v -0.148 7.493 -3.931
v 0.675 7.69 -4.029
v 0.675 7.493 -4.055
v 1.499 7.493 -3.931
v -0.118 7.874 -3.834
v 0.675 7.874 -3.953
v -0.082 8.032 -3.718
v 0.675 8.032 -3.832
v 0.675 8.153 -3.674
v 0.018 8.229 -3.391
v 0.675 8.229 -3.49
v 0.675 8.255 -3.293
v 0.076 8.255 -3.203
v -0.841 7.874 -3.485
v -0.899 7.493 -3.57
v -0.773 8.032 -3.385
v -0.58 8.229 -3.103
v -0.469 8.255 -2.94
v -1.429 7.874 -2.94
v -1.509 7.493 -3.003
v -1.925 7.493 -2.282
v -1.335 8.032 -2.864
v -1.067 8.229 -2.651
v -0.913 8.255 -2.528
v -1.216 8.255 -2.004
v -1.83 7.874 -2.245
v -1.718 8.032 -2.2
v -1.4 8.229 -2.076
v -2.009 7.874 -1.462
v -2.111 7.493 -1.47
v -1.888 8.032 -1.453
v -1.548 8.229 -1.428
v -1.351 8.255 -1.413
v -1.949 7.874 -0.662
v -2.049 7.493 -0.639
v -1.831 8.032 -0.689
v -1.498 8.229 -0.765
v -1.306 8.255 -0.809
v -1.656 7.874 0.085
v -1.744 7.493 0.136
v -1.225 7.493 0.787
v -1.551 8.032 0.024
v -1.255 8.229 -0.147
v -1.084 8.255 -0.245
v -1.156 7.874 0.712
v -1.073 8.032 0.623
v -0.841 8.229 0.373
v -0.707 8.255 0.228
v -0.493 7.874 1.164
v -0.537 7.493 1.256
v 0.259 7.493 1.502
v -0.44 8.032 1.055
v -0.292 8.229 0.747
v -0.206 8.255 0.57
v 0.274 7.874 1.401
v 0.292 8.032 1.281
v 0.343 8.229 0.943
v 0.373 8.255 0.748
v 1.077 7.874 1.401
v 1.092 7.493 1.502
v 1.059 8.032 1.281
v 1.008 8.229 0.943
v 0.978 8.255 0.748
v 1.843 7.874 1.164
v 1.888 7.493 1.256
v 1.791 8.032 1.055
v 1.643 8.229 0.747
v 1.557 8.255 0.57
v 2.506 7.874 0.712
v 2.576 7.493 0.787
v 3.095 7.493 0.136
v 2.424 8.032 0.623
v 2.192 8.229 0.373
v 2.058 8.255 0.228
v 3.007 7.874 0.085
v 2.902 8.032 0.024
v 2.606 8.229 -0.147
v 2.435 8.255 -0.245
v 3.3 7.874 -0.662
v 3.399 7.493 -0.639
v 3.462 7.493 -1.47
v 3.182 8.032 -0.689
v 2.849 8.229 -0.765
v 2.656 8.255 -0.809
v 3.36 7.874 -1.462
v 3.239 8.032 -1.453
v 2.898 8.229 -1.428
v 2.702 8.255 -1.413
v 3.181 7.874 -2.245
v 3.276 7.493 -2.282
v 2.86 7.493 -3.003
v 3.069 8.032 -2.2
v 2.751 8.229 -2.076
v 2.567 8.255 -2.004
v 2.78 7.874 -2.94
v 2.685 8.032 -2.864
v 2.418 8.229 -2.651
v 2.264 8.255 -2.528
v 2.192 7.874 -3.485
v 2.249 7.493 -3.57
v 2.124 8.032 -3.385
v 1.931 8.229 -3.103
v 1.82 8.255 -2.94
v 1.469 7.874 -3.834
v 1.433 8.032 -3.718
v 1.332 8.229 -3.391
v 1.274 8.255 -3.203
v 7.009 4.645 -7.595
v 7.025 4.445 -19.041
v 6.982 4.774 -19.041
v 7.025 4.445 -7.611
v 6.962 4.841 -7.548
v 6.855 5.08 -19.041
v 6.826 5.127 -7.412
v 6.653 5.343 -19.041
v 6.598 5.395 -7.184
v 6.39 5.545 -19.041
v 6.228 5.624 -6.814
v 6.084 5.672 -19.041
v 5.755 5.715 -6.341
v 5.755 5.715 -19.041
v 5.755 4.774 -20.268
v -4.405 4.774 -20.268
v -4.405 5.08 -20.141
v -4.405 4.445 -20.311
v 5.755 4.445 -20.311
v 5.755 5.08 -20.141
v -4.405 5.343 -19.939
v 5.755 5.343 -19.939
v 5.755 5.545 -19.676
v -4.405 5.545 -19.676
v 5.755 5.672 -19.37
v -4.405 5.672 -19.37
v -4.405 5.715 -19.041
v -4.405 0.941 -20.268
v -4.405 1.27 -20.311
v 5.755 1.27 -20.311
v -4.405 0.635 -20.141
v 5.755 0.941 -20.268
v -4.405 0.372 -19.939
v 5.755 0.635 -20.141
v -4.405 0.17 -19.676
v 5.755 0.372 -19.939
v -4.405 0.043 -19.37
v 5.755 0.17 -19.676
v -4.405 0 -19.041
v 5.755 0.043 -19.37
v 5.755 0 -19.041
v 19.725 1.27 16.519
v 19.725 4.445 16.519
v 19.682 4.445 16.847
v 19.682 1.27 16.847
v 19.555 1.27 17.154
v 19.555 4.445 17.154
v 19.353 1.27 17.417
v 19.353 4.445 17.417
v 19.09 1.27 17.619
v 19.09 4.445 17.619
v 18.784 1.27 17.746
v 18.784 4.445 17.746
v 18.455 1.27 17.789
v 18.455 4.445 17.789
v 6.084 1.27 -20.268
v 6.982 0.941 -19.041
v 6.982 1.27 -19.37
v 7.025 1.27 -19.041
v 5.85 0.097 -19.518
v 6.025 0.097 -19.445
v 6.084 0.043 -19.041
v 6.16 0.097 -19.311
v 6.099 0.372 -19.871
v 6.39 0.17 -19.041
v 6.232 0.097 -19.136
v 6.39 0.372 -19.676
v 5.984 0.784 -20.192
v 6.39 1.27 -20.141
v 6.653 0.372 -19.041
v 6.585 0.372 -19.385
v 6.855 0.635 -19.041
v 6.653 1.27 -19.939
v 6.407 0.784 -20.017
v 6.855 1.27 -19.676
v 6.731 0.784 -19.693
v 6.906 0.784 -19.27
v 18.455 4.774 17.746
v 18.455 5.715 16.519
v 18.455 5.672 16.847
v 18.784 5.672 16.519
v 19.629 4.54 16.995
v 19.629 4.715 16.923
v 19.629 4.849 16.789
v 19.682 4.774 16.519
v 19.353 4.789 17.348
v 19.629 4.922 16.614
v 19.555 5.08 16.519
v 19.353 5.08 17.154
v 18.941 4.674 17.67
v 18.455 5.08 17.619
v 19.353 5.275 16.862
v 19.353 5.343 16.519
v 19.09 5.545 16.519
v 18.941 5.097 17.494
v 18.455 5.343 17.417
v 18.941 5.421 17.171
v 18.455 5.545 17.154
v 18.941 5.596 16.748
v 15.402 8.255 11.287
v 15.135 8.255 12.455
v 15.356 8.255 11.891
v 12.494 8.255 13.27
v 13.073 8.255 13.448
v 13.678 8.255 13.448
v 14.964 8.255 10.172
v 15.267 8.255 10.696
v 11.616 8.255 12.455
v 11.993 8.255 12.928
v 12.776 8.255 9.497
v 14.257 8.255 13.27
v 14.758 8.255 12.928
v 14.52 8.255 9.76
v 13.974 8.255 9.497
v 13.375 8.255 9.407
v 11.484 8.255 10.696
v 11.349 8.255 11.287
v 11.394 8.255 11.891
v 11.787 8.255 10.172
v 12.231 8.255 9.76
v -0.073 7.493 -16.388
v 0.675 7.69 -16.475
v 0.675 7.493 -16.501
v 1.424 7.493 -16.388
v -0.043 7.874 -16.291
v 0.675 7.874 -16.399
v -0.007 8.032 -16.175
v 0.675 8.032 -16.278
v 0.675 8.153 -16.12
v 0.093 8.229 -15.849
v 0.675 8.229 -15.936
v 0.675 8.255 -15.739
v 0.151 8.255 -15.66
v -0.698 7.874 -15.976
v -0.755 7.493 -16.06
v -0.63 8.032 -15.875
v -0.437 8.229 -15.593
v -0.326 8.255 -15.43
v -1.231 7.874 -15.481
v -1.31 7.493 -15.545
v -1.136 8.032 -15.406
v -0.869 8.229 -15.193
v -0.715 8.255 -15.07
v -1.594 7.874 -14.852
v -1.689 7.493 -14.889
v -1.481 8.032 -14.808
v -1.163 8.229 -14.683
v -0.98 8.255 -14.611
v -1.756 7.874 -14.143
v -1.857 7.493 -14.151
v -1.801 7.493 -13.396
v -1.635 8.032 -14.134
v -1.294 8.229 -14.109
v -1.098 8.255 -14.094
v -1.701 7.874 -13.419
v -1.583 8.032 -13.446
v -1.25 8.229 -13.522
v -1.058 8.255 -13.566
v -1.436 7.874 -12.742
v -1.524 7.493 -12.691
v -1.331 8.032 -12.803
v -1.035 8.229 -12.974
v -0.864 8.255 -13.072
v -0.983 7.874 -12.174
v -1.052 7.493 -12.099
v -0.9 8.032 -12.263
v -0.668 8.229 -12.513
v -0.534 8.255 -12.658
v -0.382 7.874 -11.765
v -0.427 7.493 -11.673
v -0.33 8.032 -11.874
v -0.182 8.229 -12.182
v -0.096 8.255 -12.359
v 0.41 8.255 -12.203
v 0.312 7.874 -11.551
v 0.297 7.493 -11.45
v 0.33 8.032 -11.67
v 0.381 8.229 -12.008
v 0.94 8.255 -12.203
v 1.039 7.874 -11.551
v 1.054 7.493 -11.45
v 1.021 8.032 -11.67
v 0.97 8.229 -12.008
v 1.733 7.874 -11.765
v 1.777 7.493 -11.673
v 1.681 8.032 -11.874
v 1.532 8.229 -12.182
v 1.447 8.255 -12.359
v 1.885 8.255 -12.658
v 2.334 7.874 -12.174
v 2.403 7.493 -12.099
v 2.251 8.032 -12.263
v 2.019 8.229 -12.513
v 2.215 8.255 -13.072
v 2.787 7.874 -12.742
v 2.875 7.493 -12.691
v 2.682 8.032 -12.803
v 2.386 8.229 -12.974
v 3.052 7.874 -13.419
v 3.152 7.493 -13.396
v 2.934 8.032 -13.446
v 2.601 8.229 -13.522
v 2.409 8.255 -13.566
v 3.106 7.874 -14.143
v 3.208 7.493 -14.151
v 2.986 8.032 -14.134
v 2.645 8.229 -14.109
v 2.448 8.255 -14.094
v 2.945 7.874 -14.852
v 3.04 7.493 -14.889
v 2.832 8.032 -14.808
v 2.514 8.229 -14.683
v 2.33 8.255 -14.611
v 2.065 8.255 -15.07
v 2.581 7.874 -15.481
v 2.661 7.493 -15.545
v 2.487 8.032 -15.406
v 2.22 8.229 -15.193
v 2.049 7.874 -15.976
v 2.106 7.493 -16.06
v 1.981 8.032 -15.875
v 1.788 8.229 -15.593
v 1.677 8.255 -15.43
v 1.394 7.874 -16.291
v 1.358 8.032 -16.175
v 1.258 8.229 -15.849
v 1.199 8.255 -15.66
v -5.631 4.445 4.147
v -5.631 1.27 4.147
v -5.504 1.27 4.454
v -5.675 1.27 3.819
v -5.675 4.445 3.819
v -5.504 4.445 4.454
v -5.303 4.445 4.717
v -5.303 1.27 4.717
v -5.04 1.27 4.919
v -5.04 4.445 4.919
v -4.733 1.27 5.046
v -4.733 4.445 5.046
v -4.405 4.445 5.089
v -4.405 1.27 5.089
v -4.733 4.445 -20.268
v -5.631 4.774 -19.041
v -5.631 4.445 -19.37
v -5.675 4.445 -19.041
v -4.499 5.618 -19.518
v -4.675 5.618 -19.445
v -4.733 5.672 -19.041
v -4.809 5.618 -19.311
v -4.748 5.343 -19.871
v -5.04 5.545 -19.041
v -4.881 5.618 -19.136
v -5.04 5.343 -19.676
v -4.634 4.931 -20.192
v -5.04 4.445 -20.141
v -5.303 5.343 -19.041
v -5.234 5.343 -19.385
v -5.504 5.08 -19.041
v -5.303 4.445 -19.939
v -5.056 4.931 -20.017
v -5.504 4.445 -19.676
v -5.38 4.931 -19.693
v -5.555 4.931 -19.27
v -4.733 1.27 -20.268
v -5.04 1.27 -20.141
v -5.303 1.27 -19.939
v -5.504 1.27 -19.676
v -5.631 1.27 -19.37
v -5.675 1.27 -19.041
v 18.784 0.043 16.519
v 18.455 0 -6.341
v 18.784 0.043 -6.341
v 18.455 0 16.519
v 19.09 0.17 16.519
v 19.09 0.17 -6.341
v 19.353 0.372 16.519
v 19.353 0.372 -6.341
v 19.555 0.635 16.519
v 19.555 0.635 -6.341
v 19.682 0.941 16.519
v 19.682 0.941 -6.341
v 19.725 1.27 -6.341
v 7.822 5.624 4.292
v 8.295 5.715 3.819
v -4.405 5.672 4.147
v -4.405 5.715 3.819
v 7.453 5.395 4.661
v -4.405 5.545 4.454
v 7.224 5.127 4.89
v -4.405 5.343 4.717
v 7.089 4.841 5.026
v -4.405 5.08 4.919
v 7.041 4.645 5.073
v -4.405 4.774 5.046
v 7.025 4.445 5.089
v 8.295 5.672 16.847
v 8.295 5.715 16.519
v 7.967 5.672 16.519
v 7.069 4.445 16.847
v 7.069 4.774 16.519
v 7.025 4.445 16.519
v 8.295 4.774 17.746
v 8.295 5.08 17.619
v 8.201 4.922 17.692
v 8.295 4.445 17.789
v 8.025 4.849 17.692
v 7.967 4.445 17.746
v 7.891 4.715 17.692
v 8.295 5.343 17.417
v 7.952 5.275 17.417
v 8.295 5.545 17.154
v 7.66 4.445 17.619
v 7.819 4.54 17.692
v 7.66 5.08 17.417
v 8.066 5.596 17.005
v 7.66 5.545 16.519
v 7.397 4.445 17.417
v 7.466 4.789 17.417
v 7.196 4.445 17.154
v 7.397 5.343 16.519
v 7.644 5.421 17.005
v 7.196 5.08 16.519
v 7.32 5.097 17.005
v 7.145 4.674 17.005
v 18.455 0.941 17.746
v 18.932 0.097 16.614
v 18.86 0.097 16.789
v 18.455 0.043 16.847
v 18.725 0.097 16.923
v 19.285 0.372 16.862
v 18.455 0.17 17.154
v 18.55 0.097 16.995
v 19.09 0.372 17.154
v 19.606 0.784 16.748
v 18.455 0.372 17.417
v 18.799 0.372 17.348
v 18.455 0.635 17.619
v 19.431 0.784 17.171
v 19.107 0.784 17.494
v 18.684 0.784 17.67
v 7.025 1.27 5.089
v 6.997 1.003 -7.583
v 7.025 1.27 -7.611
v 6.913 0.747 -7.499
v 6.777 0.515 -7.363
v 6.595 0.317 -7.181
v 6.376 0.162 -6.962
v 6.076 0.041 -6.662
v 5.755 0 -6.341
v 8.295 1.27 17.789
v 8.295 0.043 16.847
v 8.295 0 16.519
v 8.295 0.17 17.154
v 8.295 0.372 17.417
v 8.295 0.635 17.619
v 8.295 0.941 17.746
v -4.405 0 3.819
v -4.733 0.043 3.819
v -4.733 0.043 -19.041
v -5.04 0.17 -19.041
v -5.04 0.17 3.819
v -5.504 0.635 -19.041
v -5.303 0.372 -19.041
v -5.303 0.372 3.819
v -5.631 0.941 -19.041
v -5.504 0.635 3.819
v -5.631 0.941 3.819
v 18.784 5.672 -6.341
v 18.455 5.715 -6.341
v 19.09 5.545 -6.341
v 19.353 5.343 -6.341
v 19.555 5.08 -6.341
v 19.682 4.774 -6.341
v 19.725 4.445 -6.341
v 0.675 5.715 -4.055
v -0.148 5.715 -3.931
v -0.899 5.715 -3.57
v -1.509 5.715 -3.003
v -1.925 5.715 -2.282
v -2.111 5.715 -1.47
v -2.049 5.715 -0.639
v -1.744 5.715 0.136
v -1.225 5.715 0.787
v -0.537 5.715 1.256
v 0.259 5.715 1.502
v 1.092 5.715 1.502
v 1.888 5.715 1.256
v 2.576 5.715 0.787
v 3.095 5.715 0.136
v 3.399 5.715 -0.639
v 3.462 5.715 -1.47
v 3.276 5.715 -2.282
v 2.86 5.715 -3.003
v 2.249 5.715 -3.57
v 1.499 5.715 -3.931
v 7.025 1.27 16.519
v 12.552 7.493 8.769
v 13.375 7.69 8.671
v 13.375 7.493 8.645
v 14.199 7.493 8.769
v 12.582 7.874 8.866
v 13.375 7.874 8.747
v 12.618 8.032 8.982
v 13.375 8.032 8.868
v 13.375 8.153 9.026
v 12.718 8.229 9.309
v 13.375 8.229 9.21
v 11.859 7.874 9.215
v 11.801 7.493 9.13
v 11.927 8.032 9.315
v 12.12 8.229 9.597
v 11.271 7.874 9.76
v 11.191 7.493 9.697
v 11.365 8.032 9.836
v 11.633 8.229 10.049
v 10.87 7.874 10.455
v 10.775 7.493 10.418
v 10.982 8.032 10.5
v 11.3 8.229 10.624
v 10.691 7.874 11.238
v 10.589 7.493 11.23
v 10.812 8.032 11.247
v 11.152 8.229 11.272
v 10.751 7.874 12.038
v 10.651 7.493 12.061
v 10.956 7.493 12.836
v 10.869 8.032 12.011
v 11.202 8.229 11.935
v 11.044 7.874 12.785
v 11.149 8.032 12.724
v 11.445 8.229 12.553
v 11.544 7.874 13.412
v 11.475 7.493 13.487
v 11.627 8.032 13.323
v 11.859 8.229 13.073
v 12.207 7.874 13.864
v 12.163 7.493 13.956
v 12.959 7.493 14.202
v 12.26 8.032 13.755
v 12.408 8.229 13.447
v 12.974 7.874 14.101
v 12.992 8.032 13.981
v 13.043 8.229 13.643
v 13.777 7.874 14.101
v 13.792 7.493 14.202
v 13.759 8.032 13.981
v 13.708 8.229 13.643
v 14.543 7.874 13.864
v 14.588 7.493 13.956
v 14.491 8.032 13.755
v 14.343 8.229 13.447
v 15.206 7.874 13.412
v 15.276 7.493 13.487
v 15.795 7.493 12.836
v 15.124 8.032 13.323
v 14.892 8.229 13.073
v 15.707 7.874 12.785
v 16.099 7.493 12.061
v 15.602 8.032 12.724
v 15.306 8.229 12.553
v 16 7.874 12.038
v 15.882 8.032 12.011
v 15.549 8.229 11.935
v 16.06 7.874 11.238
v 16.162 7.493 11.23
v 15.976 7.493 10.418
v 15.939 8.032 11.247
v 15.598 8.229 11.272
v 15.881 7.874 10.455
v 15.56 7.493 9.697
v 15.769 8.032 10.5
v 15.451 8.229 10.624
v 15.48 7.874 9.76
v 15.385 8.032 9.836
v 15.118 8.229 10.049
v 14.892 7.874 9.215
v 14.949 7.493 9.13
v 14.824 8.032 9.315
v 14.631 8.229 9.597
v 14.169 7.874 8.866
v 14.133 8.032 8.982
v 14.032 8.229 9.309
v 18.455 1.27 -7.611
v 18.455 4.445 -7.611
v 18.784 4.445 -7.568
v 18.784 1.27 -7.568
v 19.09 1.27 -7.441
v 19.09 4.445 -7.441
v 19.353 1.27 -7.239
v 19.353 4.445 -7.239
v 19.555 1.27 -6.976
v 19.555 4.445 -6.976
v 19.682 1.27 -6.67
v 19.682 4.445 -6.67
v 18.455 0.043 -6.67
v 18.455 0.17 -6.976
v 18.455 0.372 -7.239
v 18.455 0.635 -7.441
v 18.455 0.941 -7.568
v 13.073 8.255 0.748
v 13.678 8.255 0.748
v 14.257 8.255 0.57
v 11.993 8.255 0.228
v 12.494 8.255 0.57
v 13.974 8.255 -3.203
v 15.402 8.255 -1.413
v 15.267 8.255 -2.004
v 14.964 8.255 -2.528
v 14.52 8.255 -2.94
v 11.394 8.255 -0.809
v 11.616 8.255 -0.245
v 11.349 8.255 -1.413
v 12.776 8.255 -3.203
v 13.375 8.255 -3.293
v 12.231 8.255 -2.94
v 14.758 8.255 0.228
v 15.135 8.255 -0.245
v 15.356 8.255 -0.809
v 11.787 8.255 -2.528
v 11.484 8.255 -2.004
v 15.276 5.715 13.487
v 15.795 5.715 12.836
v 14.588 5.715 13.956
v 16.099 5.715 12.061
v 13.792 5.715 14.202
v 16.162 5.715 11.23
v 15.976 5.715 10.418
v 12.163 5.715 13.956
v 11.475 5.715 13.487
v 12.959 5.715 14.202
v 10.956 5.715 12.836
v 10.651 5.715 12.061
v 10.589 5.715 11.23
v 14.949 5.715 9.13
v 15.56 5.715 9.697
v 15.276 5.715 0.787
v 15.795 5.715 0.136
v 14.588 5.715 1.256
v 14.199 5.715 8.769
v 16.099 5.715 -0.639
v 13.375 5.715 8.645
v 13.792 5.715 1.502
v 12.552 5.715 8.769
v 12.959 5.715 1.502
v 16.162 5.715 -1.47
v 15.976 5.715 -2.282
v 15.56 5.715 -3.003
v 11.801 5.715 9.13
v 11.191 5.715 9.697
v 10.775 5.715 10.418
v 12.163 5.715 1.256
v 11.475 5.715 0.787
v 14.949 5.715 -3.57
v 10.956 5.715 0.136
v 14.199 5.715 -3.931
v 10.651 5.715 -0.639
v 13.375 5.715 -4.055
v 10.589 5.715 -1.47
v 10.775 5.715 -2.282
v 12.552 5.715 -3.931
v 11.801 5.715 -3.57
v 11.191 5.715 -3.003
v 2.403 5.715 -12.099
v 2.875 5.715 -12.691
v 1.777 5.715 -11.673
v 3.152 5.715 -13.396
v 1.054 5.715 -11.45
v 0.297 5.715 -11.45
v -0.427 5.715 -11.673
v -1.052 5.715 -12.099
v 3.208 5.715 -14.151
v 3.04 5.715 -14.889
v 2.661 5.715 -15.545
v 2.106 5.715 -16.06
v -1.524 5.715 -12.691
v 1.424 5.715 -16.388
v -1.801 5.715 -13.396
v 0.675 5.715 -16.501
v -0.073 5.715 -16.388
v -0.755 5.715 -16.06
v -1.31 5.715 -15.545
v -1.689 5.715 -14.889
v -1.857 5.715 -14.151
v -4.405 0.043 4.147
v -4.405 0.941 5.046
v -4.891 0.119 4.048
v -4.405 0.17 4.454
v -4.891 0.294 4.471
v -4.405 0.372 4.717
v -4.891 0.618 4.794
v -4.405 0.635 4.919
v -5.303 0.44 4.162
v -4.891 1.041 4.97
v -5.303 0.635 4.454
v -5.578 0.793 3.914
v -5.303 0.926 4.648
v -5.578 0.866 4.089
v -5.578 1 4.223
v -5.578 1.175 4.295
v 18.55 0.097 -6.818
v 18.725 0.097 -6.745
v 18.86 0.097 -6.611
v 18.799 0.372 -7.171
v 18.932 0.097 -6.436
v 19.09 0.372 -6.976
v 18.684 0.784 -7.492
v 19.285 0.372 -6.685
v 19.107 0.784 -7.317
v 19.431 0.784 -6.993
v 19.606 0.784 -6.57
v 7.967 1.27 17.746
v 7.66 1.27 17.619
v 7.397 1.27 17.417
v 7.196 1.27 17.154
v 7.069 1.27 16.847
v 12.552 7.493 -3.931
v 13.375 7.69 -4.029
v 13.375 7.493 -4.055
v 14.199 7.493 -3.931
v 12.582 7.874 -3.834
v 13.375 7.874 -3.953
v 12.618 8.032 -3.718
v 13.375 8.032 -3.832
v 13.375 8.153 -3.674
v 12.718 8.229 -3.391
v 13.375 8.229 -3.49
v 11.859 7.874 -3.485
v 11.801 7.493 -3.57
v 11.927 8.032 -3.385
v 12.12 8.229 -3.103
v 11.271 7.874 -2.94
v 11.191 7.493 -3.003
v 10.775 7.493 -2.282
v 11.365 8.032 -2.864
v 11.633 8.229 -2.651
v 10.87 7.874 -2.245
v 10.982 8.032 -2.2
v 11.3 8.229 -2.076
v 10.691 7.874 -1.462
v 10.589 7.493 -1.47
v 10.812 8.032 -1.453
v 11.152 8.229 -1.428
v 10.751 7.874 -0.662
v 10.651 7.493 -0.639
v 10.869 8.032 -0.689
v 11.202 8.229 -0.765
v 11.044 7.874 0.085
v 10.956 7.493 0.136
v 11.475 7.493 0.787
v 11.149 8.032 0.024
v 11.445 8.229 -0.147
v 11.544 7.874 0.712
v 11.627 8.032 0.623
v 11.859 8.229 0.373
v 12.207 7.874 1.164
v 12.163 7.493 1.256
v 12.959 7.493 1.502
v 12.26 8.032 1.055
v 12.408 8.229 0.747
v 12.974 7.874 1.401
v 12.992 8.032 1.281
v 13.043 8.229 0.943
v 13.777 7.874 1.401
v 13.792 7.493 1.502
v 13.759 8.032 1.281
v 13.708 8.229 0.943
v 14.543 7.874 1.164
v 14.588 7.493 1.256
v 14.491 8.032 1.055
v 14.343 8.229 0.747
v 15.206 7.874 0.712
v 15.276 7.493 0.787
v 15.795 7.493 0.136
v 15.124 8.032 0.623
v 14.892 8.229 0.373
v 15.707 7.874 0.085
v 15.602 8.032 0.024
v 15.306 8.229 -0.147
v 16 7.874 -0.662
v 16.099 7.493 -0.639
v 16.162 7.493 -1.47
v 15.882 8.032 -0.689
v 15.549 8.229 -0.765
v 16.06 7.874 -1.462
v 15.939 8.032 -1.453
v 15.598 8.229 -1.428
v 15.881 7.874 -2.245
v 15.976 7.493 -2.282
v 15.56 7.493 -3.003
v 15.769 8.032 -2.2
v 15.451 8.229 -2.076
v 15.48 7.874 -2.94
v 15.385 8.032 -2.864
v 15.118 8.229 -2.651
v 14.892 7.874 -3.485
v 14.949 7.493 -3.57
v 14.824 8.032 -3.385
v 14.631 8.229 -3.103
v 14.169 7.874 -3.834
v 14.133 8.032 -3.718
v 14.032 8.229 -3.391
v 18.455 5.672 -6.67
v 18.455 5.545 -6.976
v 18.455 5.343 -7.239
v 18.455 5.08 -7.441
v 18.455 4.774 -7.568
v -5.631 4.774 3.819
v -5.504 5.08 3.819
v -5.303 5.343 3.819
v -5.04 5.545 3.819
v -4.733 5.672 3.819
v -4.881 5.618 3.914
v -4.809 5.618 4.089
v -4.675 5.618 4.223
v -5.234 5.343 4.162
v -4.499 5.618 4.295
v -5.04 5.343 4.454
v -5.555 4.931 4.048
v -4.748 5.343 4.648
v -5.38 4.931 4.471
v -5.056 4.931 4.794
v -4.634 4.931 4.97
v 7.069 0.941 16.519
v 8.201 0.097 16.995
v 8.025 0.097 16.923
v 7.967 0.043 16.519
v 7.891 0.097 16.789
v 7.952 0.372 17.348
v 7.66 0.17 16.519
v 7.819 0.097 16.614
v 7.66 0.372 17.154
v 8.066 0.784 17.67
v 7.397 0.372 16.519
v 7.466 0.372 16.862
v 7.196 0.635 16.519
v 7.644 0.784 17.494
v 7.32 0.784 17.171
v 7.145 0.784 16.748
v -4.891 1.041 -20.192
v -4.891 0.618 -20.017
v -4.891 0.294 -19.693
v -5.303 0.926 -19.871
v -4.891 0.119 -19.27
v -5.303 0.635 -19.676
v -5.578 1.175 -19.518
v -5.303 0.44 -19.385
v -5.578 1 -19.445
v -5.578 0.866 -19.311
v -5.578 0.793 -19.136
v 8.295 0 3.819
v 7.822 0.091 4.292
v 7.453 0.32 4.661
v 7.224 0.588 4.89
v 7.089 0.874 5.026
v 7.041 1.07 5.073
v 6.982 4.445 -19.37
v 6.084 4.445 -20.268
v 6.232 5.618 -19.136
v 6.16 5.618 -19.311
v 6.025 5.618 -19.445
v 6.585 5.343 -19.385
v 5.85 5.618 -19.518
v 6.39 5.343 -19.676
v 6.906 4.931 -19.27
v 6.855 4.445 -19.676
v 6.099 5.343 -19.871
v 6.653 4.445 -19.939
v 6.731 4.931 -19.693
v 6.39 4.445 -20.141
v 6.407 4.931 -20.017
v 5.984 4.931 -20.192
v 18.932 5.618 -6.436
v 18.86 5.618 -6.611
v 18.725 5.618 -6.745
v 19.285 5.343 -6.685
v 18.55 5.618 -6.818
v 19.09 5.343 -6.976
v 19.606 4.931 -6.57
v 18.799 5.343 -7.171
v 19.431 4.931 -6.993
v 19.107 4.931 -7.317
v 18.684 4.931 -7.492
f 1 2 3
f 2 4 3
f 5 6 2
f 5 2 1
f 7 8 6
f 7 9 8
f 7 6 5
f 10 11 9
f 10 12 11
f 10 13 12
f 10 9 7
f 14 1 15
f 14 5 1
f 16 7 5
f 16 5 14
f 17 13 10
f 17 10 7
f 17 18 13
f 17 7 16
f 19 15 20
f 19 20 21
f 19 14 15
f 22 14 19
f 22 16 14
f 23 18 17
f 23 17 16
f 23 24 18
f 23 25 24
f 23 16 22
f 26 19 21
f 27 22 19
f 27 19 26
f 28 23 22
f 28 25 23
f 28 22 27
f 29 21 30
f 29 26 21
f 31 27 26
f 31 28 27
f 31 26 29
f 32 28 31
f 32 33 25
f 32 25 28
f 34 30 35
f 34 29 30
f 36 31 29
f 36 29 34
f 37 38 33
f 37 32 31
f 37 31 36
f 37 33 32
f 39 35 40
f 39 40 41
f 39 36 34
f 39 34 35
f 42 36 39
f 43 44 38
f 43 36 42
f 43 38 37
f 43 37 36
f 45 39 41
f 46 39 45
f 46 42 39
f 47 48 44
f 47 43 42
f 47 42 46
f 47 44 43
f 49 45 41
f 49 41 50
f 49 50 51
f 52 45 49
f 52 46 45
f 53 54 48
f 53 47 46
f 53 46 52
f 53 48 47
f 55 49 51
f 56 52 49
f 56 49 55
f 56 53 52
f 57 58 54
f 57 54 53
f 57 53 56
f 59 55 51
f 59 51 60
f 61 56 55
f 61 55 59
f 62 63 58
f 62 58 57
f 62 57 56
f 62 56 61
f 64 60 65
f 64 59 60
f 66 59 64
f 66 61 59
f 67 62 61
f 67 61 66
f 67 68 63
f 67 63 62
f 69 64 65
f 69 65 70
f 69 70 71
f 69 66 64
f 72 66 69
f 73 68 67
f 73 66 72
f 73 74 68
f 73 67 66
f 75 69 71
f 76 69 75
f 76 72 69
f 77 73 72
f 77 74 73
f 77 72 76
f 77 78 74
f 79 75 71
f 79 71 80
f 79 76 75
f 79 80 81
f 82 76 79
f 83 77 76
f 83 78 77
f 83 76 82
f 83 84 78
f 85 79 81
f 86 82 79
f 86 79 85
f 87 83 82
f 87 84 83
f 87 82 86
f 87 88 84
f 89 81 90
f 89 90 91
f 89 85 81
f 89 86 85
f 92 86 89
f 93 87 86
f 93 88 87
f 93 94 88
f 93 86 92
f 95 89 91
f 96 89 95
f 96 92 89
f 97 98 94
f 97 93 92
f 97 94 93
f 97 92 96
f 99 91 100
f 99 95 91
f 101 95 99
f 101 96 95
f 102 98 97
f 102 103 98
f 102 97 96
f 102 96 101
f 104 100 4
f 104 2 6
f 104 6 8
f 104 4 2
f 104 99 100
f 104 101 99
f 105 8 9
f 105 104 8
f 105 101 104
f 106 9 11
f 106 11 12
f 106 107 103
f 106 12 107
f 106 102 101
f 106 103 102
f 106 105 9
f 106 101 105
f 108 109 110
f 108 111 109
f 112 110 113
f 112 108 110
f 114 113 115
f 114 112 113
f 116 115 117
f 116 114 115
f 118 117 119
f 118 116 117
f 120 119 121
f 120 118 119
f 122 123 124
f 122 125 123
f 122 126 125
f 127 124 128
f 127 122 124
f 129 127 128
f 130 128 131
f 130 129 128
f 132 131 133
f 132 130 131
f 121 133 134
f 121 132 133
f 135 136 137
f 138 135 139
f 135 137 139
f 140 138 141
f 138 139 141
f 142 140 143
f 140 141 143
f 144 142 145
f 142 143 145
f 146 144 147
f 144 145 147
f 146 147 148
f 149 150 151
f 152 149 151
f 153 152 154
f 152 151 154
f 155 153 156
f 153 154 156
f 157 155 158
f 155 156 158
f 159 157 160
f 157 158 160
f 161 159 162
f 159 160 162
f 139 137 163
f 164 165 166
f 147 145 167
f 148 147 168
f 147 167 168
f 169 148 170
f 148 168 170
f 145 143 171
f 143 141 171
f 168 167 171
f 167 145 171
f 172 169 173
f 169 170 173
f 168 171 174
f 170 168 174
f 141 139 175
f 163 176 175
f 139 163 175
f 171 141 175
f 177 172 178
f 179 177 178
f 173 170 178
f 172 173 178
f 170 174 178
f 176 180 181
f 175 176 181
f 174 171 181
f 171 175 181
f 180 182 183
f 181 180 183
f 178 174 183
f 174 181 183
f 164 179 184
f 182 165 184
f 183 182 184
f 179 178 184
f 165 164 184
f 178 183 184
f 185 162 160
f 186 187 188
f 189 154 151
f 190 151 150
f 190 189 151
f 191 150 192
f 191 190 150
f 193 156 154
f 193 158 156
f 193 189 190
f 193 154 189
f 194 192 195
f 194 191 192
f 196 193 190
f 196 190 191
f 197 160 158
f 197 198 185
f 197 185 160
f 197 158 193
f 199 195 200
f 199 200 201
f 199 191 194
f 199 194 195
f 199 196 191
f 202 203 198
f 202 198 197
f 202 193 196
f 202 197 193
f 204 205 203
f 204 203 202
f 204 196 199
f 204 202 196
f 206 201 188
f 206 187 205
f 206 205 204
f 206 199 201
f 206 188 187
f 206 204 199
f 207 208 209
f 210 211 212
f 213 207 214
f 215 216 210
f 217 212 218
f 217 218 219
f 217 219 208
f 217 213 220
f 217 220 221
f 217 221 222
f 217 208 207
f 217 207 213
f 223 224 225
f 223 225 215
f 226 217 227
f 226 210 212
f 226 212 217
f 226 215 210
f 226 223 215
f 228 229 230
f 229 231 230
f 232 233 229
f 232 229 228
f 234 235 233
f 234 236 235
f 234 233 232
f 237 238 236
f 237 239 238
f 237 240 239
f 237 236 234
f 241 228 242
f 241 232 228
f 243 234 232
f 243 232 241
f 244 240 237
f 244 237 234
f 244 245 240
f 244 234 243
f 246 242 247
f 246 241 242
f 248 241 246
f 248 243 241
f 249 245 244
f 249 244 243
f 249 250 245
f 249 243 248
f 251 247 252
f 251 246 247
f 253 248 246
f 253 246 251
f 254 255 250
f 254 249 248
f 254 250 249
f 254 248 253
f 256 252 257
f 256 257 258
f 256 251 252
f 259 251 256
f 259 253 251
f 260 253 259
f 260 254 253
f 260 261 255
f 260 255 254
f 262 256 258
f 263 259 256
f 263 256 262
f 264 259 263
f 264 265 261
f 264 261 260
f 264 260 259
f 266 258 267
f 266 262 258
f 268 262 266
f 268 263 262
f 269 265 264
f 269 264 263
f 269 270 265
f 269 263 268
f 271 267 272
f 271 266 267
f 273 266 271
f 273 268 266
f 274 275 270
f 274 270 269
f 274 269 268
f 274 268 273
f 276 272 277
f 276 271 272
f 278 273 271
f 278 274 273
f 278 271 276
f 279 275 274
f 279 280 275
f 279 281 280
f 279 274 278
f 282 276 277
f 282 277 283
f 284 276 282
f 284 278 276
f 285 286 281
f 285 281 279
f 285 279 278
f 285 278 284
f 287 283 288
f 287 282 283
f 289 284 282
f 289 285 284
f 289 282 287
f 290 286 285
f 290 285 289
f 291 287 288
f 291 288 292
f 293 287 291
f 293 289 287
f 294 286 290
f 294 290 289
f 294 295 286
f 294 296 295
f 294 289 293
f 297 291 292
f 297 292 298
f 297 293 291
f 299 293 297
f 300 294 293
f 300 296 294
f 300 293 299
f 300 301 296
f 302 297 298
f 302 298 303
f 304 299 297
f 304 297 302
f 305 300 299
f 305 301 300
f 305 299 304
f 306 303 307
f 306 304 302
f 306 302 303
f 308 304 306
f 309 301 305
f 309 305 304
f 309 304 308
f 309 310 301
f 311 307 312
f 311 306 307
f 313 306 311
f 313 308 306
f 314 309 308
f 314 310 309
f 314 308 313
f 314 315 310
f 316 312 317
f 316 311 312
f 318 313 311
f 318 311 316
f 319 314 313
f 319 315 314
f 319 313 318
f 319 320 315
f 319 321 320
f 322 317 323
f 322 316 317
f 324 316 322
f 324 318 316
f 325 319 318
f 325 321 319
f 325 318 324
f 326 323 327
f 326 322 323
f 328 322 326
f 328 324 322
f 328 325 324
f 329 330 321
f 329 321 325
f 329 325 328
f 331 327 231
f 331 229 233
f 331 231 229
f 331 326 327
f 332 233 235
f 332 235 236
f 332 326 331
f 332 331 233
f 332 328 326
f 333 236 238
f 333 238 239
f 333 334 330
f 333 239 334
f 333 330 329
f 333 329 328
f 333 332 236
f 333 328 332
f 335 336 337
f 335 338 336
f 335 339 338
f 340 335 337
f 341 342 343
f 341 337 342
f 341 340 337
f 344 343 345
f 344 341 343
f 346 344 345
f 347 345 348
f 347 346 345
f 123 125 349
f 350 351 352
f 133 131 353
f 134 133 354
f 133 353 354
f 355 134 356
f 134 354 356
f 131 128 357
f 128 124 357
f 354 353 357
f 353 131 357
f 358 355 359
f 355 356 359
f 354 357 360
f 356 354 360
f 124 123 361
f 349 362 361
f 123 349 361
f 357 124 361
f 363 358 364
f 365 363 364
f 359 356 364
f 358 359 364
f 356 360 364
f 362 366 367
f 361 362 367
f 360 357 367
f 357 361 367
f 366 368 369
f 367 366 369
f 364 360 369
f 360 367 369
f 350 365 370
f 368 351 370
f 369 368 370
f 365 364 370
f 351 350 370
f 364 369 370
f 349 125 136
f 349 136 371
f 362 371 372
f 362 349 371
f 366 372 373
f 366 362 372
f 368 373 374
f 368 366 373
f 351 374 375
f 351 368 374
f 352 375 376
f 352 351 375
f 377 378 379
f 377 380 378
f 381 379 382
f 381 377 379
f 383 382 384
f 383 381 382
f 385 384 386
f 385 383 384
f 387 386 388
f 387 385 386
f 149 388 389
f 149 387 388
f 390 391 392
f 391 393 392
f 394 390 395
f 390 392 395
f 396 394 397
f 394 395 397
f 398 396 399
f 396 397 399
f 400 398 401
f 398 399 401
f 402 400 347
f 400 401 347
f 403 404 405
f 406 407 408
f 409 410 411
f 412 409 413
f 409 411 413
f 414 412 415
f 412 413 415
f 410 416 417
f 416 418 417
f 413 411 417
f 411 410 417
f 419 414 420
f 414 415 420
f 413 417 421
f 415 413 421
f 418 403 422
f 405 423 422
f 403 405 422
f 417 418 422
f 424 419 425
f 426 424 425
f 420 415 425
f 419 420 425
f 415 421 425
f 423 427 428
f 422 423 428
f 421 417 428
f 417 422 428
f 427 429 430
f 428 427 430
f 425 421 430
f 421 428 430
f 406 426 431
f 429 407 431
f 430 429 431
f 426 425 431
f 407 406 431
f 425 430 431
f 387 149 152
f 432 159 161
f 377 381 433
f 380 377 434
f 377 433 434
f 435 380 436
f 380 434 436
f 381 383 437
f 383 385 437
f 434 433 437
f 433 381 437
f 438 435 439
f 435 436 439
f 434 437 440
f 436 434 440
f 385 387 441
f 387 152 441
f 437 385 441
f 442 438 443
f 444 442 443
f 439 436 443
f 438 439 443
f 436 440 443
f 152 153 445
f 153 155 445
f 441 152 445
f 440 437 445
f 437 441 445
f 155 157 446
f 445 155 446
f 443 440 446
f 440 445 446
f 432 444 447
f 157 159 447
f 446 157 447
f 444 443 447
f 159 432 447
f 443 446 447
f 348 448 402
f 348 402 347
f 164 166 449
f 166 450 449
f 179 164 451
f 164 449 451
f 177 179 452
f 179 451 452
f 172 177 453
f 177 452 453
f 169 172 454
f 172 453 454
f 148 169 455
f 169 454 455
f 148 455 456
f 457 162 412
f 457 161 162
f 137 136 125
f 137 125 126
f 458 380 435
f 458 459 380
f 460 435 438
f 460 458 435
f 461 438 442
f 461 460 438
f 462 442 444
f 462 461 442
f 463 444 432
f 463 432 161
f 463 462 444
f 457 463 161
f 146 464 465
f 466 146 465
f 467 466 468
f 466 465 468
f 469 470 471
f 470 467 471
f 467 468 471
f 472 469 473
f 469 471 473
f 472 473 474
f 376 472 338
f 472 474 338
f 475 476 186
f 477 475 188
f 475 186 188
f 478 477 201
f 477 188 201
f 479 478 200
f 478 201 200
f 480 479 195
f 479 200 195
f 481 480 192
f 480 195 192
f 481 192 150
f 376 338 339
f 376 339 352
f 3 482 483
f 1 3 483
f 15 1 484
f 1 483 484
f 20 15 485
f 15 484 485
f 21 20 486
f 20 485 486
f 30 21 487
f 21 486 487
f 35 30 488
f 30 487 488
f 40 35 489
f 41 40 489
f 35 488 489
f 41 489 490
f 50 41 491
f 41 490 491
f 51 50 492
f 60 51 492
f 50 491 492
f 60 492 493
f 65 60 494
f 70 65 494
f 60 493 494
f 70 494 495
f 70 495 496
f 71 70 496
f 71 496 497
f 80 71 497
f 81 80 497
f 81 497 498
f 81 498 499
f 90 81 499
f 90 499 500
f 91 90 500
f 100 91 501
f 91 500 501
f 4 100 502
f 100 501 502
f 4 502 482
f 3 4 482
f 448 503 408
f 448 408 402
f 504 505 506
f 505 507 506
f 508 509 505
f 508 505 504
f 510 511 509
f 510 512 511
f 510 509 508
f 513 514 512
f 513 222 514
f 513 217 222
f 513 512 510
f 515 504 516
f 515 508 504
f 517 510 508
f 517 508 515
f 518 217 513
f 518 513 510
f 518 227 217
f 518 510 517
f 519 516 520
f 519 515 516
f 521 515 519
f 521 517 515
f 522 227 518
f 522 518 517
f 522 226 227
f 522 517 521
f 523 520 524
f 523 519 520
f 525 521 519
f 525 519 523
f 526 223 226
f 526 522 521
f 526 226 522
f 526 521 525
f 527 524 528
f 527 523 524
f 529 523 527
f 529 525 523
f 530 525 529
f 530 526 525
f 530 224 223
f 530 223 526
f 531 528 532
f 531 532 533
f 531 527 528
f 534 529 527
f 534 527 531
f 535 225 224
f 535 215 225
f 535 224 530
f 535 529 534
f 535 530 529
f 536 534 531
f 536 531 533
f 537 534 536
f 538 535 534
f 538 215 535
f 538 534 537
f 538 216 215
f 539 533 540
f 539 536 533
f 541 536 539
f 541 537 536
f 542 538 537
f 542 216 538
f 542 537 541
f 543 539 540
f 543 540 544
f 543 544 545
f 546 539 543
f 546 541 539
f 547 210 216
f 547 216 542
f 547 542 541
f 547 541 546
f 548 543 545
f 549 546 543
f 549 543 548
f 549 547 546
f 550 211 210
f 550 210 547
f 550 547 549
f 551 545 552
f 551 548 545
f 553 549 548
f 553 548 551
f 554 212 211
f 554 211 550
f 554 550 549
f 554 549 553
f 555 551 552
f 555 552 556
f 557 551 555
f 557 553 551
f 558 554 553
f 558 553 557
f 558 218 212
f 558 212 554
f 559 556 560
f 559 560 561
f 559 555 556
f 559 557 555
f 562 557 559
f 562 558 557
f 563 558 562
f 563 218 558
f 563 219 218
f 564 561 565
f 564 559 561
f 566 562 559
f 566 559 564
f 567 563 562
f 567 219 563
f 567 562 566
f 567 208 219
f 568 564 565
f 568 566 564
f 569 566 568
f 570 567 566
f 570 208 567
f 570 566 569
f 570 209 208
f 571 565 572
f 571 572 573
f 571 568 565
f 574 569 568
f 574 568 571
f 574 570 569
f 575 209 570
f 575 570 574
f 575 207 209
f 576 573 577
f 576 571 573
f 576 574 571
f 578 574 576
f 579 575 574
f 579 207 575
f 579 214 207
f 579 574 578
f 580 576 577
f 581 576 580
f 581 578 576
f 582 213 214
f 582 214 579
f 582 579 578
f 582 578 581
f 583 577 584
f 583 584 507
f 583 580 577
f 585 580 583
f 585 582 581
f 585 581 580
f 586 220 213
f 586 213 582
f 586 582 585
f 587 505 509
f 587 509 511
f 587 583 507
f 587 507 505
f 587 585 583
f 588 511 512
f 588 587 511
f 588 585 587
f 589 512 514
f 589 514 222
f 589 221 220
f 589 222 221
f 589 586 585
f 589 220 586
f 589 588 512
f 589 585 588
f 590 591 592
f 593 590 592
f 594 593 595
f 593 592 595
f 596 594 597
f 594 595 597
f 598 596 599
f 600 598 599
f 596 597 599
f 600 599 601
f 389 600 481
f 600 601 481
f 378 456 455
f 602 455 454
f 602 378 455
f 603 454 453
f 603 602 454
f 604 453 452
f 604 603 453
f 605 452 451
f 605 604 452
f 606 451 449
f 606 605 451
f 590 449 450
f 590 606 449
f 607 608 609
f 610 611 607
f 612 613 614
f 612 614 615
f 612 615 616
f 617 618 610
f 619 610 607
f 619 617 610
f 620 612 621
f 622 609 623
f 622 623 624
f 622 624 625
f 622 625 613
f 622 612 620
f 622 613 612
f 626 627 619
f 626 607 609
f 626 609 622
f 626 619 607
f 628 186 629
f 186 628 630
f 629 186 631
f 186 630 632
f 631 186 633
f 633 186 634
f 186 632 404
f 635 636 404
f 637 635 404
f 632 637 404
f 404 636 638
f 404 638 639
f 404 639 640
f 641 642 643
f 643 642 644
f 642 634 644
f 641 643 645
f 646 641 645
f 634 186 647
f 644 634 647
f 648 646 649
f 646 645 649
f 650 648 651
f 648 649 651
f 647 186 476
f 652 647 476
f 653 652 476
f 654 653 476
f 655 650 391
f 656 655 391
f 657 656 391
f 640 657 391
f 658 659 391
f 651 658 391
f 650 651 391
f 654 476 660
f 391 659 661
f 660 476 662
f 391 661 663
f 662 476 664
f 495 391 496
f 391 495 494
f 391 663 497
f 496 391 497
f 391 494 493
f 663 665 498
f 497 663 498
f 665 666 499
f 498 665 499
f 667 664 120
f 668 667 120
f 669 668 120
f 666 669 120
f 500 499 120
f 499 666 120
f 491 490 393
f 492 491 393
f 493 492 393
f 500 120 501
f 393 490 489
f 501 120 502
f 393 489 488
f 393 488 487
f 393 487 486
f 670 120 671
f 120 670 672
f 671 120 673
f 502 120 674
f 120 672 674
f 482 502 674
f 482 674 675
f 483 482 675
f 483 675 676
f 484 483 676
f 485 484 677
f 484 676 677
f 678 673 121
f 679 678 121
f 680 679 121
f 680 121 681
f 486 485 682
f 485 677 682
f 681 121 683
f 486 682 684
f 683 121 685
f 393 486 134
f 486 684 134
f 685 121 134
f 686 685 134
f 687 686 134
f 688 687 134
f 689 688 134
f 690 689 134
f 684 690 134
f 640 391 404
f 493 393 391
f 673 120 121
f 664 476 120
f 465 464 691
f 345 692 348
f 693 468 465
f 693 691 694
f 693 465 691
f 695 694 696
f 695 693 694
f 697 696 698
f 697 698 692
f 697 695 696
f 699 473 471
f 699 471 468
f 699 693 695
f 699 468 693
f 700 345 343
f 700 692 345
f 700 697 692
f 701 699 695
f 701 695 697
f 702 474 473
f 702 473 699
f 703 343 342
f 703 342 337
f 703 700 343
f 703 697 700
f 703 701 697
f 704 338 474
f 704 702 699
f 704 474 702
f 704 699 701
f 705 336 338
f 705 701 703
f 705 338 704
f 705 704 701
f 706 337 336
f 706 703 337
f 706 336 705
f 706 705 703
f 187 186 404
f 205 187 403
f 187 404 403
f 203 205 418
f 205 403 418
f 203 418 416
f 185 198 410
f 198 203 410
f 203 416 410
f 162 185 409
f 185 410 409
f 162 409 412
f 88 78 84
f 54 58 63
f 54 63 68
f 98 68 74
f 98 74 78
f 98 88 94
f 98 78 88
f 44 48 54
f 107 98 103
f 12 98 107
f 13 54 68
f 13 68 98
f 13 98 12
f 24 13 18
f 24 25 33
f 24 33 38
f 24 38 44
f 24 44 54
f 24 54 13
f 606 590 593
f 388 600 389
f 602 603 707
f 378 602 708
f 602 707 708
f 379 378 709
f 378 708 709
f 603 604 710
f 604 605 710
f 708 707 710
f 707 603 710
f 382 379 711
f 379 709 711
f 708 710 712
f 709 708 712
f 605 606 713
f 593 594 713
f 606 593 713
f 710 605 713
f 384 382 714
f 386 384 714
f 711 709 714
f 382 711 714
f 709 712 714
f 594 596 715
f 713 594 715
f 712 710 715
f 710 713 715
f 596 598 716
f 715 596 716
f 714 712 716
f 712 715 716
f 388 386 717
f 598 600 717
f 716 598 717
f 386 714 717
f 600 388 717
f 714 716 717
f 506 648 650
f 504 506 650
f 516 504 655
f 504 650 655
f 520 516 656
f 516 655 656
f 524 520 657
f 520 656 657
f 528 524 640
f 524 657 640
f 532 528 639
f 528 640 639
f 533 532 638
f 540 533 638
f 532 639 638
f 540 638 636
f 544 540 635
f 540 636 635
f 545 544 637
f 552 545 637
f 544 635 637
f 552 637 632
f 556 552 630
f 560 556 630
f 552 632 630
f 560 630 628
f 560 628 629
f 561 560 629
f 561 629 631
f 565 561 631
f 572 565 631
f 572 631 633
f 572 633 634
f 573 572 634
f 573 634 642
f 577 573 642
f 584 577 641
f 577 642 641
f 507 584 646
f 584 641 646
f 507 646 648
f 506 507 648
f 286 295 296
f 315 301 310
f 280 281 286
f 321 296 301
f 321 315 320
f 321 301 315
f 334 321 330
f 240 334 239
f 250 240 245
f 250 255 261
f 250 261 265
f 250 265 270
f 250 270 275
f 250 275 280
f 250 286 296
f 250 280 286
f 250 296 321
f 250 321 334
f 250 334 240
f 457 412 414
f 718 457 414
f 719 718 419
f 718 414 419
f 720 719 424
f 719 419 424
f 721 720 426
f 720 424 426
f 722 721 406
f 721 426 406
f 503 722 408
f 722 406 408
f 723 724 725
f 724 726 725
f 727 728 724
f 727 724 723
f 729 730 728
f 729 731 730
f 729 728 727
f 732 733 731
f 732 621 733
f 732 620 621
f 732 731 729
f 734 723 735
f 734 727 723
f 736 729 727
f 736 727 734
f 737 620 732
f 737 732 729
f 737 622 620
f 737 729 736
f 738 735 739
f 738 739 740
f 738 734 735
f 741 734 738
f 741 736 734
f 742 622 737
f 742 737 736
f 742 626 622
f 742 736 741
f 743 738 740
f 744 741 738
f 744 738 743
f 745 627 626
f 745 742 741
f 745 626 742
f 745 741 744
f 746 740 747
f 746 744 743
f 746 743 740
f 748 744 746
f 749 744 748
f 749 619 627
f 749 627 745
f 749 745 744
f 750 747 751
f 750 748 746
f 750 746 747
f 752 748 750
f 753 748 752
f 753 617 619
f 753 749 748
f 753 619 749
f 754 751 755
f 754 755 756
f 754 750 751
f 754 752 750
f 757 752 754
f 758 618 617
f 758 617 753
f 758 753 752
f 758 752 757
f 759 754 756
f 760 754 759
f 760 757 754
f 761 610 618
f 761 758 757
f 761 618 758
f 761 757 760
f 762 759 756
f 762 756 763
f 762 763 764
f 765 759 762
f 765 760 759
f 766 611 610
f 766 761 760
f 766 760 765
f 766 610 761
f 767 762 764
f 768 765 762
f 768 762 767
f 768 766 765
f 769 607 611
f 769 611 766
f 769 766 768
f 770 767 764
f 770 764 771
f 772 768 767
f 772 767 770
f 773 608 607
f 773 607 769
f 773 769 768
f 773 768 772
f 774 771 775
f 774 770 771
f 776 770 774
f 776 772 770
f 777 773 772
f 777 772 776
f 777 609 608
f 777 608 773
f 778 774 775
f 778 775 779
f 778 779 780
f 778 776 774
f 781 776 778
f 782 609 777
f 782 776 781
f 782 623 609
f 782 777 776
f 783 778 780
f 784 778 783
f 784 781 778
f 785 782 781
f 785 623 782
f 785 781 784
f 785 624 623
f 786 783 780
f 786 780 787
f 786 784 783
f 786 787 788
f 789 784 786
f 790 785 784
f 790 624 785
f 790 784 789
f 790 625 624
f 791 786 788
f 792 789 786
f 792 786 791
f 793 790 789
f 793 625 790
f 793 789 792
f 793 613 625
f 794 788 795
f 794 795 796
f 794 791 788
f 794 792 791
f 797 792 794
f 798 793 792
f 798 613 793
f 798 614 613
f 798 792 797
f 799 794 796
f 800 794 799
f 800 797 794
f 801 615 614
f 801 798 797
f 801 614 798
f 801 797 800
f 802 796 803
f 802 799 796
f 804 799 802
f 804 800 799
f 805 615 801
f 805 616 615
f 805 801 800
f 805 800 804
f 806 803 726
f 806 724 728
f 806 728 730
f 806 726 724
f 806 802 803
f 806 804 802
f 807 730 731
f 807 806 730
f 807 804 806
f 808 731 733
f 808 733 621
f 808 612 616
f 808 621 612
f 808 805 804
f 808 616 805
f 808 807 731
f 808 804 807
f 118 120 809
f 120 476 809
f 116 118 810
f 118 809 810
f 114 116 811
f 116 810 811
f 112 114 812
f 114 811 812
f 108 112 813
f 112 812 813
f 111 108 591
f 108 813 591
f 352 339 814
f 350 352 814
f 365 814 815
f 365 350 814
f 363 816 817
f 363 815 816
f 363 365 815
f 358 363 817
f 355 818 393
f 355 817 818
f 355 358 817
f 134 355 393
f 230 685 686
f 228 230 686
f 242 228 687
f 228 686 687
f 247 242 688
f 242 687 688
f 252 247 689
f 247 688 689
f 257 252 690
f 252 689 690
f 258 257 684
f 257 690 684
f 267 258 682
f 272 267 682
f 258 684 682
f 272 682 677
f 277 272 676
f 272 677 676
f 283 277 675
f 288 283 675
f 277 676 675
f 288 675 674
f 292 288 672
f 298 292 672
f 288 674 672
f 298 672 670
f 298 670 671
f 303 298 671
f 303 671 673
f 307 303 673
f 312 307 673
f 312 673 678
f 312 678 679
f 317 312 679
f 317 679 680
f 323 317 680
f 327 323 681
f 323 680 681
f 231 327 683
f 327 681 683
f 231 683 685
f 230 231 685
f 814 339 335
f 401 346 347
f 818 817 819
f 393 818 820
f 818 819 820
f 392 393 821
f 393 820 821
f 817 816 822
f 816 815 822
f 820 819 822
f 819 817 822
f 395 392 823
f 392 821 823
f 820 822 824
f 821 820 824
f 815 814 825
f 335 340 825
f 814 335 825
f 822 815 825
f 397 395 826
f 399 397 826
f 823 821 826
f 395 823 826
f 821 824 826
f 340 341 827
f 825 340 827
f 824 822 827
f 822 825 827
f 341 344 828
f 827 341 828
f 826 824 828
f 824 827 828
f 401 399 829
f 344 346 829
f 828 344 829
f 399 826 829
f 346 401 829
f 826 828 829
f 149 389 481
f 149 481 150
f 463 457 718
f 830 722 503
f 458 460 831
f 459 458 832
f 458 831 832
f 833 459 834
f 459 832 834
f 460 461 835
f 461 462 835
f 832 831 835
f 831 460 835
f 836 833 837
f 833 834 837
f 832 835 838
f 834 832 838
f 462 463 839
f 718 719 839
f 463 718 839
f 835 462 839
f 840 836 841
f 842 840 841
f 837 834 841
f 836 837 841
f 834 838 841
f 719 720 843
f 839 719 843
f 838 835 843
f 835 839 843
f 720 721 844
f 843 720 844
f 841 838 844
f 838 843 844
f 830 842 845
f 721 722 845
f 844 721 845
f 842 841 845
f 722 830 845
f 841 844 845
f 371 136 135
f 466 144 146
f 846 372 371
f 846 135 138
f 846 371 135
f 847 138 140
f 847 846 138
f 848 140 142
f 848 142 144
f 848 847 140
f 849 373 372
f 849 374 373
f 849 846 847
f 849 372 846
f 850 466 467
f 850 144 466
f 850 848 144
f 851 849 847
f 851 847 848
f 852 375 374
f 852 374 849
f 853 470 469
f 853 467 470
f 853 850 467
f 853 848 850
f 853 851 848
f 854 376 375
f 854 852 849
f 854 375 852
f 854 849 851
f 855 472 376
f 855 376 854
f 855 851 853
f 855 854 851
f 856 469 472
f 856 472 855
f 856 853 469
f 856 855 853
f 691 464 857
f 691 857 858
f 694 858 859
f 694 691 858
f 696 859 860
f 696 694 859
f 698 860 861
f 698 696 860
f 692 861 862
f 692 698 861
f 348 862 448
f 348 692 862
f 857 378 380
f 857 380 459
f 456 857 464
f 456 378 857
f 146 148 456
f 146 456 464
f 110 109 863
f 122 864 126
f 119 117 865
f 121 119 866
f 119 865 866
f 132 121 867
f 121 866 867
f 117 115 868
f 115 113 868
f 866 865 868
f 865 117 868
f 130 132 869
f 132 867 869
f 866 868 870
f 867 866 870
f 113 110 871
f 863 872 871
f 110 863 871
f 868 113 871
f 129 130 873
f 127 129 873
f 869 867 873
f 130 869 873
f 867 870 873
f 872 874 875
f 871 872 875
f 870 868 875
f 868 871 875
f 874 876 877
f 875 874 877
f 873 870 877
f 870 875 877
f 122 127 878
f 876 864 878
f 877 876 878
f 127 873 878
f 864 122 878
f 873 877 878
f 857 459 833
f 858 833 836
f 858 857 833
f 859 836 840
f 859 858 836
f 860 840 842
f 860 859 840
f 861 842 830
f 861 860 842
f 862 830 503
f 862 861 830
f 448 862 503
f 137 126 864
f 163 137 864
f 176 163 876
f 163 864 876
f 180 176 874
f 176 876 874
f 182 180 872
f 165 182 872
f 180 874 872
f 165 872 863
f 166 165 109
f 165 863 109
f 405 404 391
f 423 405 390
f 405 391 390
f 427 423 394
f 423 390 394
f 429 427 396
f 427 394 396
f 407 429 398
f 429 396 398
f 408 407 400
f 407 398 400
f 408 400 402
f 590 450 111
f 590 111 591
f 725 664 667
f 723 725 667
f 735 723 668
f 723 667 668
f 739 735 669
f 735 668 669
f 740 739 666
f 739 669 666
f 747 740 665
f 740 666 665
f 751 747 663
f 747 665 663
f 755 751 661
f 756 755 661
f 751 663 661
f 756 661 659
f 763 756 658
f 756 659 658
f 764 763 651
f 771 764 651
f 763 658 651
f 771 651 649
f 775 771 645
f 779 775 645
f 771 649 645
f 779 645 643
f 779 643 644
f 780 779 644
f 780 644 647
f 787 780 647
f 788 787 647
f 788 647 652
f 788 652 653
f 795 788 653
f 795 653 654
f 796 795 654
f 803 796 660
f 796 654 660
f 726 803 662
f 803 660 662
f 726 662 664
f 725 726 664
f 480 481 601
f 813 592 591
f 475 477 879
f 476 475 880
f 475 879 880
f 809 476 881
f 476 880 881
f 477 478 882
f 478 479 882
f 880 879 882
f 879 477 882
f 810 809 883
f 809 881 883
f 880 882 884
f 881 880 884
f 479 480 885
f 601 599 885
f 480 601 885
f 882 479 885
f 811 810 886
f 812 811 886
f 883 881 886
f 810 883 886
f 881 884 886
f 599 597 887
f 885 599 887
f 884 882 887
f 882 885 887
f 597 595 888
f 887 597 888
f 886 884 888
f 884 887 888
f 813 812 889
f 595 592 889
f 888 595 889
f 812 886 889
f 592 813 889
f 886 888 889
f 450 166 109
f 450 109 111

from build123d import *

# Parameters (mm, degrees)
BOSS_EXTRUDE1_DEPTH = 5.715
SKETCH2_R           = 2.794
SKETCH2_R_2         = 2.54
BOSS_EXTRUDE3_DEPTH = 2.54
FILLET1_R           = 1.27
FILLET2_R           = 1.27
FILLET3_R           = 0.762


with BuildPart() as part:
    # Sketch1 → Boss-Extrude1 (new body)
    with BuildSketch(Plane(origin=(0, 0, 0), x_dir=(1, 0, 0), z_dir=(0, 1, 0))):
        Polygon((-5.674598366, 20.311212687), (7.025401634, 20.311212687), (7.025401634, 7.611212687), (19.725401634, 7.611212687), (19.725401634, -17.788787313), (7.025401634, -17.788787313), (7.025401634, -5.088787313), (-5.674598366, -5.088787313), align=None)
    extrude(amount=BOSS_EXTRUDE1_DEPTH)

    # Sketch2 → Boss-Extrude3 (add)
    with BuildSketch(Plane(origin=(0, 5.715, 0), x_dir=(1, 0, 0), z_dir=(0, 1, 0))):
        with Locations(Location((0.675401634, 1.261212687, 0), (0, 0, 90))):
            Circle(SKETCH2_R)
        with Locations(Location((13.375401634, 1.261212687, 0), (0, 0, 90))):
            Circle(SKETCH2_R)
        with Locations(Location((0.675401634, 13.961212687, 0), (0, 0, 90))):
            Circle(SKETCH2_R_2)
        with Locations(Location((13.375401634, -11.438787313, 0), (0, 0, 90))):
            Circle(SKETCH2_R)
    extrude(amount=BOSS_EXTRUDE3_DEPTH)

    # Fillet1
    fillet1_edges = [part.edges().sort_by_distance(p)[0] for p in [
        (7.025401634, 5.715, 11.438787313),
        (0.675401634, 0, 5.088787313),
        (13.375401634, 5.715, 17.788787313),
        (-5.674598366, 2.8575, -20.311212687),
        (7.025401634, 2.8575, -20.311212687),
        (19.725401634, 2.8575, -7.611212687),
        (19.725401634, 2.8575, 17.788787313),
        (7.025401634, 2.8575, 17.788787313),
        (-5.674598366, 2.8575, 5.088787313),
        (19.725401634, 5.715, 5.088787313),
        (13.375401634, 5.715, -7.611212687),
        (7.025401634, 5.715, -13.961212687),
        (0.675401634, 5.715, -20.311212687),
        (-5.674598366, 5.715, -7.611212687),
        (0.675401634, 5.715, 5.088787313),
        (0.675401634, 0, -20.311212687),
        (7.025401634, 0, -13.961212687),
        (13.375401634, 0, -7.611212687),
        (19.725401634, 0, 5.088787313),
        (13.375401634, 0, 17.788787313),
        (7.025401634, 0, 11.438787313),
    ]]
    fillet(fillet1_edges, radius=FILLET1_R)

    # Fillet2
    # the kernel refuses this fillet: 1.27 mm, written as the material it takes off along each edge
    with BuildSketch(Plane(origin=(-4.404598366, 1.27, -19.041212687), x_dir=(0, -1, 0), z_dir=(-1, 0, 0))) as fillet2_piece_1_section:
        Polygon((0, 0), (FILLET2_R, 0), (FILLET2_R, -FILLET2_R), (0, -FILLET2_R), align=None)
    fillet2_piece_1 = extrude(amount=FILLET2_R, mode=Mode.PRIVATE)
    fillet2_piece_1 = fillet2_piece_1 - Plane(origin=(-4.404598366, 1.27, -19.041212687), x_dir=(0, 0.7071067811865475, 0.7071067811865475), z_dir=(-1, 0, 0)) * Sphere(FILLET2_R, mode=Mode.PRIVATE)
    add(fillet2_piece_1, mode=Mode.SUBTRACT)
    with BuildSketch(Plane(origin=(-4.404598366, 1.27, 3.818787313), x_dir=(0, -1, 0), z_dir=(-1, 0, 0))) as fillet2_piece_2_section:
        Polygon((0, 0), (FILLET2_R, 0), (FILLET2_R, FILLET2_R), (0, FILLET2_R), align=None)
    fillet2_piece_2 = extrude(amount=FILLET2_R, mode=Mode.PRIVATE)
    fillet2_piece_2 = fillet2_piece_2 - Plane(origin=(-4.404598366, 1.27, 3.818787313), x_dir=(0, 0.7071067811865475, -0.7071067811865475), z_dir=(-1, 0, 0)) * Sphere(FILLET2_R, mode=Mode.PRIVATE)
    add(fillet2_piece_2, mode=Mode.SUBTRACT)
    with BuildSketch(Plane(origin=(-5.674598366, 0, 3.818787313), x_dir=(0, 1, 0), z_dir=(0, 0, -1))) as fillet2_piece_3:
        with BuildLine():
            CenterArc((FILLET2_R, FILLET2_R), FILLET2_R, 180, 90)
            Line((0, FILLET2_R), (0, 0))
            Line((0, 0), (FILLET2_R, 0))
        make_face()
    extrude(amount=22.86, mode=Mode.SUBTRACT)

    # Fillet3
    fillet3_edges = [part.edges().sort_by_distance(p)[0] for p in [
        (0.675401634, 8.255, 1.532787313),
        (13.375401634, 8.255, 1.532787313),
        (0.675401634, 8.255, -11.421212687),
        (13.375401634, 8.255, 14.232787313),
    ]]
    fillet(fillet3_edges, radius=FILLET3_R)


solid = part.part
